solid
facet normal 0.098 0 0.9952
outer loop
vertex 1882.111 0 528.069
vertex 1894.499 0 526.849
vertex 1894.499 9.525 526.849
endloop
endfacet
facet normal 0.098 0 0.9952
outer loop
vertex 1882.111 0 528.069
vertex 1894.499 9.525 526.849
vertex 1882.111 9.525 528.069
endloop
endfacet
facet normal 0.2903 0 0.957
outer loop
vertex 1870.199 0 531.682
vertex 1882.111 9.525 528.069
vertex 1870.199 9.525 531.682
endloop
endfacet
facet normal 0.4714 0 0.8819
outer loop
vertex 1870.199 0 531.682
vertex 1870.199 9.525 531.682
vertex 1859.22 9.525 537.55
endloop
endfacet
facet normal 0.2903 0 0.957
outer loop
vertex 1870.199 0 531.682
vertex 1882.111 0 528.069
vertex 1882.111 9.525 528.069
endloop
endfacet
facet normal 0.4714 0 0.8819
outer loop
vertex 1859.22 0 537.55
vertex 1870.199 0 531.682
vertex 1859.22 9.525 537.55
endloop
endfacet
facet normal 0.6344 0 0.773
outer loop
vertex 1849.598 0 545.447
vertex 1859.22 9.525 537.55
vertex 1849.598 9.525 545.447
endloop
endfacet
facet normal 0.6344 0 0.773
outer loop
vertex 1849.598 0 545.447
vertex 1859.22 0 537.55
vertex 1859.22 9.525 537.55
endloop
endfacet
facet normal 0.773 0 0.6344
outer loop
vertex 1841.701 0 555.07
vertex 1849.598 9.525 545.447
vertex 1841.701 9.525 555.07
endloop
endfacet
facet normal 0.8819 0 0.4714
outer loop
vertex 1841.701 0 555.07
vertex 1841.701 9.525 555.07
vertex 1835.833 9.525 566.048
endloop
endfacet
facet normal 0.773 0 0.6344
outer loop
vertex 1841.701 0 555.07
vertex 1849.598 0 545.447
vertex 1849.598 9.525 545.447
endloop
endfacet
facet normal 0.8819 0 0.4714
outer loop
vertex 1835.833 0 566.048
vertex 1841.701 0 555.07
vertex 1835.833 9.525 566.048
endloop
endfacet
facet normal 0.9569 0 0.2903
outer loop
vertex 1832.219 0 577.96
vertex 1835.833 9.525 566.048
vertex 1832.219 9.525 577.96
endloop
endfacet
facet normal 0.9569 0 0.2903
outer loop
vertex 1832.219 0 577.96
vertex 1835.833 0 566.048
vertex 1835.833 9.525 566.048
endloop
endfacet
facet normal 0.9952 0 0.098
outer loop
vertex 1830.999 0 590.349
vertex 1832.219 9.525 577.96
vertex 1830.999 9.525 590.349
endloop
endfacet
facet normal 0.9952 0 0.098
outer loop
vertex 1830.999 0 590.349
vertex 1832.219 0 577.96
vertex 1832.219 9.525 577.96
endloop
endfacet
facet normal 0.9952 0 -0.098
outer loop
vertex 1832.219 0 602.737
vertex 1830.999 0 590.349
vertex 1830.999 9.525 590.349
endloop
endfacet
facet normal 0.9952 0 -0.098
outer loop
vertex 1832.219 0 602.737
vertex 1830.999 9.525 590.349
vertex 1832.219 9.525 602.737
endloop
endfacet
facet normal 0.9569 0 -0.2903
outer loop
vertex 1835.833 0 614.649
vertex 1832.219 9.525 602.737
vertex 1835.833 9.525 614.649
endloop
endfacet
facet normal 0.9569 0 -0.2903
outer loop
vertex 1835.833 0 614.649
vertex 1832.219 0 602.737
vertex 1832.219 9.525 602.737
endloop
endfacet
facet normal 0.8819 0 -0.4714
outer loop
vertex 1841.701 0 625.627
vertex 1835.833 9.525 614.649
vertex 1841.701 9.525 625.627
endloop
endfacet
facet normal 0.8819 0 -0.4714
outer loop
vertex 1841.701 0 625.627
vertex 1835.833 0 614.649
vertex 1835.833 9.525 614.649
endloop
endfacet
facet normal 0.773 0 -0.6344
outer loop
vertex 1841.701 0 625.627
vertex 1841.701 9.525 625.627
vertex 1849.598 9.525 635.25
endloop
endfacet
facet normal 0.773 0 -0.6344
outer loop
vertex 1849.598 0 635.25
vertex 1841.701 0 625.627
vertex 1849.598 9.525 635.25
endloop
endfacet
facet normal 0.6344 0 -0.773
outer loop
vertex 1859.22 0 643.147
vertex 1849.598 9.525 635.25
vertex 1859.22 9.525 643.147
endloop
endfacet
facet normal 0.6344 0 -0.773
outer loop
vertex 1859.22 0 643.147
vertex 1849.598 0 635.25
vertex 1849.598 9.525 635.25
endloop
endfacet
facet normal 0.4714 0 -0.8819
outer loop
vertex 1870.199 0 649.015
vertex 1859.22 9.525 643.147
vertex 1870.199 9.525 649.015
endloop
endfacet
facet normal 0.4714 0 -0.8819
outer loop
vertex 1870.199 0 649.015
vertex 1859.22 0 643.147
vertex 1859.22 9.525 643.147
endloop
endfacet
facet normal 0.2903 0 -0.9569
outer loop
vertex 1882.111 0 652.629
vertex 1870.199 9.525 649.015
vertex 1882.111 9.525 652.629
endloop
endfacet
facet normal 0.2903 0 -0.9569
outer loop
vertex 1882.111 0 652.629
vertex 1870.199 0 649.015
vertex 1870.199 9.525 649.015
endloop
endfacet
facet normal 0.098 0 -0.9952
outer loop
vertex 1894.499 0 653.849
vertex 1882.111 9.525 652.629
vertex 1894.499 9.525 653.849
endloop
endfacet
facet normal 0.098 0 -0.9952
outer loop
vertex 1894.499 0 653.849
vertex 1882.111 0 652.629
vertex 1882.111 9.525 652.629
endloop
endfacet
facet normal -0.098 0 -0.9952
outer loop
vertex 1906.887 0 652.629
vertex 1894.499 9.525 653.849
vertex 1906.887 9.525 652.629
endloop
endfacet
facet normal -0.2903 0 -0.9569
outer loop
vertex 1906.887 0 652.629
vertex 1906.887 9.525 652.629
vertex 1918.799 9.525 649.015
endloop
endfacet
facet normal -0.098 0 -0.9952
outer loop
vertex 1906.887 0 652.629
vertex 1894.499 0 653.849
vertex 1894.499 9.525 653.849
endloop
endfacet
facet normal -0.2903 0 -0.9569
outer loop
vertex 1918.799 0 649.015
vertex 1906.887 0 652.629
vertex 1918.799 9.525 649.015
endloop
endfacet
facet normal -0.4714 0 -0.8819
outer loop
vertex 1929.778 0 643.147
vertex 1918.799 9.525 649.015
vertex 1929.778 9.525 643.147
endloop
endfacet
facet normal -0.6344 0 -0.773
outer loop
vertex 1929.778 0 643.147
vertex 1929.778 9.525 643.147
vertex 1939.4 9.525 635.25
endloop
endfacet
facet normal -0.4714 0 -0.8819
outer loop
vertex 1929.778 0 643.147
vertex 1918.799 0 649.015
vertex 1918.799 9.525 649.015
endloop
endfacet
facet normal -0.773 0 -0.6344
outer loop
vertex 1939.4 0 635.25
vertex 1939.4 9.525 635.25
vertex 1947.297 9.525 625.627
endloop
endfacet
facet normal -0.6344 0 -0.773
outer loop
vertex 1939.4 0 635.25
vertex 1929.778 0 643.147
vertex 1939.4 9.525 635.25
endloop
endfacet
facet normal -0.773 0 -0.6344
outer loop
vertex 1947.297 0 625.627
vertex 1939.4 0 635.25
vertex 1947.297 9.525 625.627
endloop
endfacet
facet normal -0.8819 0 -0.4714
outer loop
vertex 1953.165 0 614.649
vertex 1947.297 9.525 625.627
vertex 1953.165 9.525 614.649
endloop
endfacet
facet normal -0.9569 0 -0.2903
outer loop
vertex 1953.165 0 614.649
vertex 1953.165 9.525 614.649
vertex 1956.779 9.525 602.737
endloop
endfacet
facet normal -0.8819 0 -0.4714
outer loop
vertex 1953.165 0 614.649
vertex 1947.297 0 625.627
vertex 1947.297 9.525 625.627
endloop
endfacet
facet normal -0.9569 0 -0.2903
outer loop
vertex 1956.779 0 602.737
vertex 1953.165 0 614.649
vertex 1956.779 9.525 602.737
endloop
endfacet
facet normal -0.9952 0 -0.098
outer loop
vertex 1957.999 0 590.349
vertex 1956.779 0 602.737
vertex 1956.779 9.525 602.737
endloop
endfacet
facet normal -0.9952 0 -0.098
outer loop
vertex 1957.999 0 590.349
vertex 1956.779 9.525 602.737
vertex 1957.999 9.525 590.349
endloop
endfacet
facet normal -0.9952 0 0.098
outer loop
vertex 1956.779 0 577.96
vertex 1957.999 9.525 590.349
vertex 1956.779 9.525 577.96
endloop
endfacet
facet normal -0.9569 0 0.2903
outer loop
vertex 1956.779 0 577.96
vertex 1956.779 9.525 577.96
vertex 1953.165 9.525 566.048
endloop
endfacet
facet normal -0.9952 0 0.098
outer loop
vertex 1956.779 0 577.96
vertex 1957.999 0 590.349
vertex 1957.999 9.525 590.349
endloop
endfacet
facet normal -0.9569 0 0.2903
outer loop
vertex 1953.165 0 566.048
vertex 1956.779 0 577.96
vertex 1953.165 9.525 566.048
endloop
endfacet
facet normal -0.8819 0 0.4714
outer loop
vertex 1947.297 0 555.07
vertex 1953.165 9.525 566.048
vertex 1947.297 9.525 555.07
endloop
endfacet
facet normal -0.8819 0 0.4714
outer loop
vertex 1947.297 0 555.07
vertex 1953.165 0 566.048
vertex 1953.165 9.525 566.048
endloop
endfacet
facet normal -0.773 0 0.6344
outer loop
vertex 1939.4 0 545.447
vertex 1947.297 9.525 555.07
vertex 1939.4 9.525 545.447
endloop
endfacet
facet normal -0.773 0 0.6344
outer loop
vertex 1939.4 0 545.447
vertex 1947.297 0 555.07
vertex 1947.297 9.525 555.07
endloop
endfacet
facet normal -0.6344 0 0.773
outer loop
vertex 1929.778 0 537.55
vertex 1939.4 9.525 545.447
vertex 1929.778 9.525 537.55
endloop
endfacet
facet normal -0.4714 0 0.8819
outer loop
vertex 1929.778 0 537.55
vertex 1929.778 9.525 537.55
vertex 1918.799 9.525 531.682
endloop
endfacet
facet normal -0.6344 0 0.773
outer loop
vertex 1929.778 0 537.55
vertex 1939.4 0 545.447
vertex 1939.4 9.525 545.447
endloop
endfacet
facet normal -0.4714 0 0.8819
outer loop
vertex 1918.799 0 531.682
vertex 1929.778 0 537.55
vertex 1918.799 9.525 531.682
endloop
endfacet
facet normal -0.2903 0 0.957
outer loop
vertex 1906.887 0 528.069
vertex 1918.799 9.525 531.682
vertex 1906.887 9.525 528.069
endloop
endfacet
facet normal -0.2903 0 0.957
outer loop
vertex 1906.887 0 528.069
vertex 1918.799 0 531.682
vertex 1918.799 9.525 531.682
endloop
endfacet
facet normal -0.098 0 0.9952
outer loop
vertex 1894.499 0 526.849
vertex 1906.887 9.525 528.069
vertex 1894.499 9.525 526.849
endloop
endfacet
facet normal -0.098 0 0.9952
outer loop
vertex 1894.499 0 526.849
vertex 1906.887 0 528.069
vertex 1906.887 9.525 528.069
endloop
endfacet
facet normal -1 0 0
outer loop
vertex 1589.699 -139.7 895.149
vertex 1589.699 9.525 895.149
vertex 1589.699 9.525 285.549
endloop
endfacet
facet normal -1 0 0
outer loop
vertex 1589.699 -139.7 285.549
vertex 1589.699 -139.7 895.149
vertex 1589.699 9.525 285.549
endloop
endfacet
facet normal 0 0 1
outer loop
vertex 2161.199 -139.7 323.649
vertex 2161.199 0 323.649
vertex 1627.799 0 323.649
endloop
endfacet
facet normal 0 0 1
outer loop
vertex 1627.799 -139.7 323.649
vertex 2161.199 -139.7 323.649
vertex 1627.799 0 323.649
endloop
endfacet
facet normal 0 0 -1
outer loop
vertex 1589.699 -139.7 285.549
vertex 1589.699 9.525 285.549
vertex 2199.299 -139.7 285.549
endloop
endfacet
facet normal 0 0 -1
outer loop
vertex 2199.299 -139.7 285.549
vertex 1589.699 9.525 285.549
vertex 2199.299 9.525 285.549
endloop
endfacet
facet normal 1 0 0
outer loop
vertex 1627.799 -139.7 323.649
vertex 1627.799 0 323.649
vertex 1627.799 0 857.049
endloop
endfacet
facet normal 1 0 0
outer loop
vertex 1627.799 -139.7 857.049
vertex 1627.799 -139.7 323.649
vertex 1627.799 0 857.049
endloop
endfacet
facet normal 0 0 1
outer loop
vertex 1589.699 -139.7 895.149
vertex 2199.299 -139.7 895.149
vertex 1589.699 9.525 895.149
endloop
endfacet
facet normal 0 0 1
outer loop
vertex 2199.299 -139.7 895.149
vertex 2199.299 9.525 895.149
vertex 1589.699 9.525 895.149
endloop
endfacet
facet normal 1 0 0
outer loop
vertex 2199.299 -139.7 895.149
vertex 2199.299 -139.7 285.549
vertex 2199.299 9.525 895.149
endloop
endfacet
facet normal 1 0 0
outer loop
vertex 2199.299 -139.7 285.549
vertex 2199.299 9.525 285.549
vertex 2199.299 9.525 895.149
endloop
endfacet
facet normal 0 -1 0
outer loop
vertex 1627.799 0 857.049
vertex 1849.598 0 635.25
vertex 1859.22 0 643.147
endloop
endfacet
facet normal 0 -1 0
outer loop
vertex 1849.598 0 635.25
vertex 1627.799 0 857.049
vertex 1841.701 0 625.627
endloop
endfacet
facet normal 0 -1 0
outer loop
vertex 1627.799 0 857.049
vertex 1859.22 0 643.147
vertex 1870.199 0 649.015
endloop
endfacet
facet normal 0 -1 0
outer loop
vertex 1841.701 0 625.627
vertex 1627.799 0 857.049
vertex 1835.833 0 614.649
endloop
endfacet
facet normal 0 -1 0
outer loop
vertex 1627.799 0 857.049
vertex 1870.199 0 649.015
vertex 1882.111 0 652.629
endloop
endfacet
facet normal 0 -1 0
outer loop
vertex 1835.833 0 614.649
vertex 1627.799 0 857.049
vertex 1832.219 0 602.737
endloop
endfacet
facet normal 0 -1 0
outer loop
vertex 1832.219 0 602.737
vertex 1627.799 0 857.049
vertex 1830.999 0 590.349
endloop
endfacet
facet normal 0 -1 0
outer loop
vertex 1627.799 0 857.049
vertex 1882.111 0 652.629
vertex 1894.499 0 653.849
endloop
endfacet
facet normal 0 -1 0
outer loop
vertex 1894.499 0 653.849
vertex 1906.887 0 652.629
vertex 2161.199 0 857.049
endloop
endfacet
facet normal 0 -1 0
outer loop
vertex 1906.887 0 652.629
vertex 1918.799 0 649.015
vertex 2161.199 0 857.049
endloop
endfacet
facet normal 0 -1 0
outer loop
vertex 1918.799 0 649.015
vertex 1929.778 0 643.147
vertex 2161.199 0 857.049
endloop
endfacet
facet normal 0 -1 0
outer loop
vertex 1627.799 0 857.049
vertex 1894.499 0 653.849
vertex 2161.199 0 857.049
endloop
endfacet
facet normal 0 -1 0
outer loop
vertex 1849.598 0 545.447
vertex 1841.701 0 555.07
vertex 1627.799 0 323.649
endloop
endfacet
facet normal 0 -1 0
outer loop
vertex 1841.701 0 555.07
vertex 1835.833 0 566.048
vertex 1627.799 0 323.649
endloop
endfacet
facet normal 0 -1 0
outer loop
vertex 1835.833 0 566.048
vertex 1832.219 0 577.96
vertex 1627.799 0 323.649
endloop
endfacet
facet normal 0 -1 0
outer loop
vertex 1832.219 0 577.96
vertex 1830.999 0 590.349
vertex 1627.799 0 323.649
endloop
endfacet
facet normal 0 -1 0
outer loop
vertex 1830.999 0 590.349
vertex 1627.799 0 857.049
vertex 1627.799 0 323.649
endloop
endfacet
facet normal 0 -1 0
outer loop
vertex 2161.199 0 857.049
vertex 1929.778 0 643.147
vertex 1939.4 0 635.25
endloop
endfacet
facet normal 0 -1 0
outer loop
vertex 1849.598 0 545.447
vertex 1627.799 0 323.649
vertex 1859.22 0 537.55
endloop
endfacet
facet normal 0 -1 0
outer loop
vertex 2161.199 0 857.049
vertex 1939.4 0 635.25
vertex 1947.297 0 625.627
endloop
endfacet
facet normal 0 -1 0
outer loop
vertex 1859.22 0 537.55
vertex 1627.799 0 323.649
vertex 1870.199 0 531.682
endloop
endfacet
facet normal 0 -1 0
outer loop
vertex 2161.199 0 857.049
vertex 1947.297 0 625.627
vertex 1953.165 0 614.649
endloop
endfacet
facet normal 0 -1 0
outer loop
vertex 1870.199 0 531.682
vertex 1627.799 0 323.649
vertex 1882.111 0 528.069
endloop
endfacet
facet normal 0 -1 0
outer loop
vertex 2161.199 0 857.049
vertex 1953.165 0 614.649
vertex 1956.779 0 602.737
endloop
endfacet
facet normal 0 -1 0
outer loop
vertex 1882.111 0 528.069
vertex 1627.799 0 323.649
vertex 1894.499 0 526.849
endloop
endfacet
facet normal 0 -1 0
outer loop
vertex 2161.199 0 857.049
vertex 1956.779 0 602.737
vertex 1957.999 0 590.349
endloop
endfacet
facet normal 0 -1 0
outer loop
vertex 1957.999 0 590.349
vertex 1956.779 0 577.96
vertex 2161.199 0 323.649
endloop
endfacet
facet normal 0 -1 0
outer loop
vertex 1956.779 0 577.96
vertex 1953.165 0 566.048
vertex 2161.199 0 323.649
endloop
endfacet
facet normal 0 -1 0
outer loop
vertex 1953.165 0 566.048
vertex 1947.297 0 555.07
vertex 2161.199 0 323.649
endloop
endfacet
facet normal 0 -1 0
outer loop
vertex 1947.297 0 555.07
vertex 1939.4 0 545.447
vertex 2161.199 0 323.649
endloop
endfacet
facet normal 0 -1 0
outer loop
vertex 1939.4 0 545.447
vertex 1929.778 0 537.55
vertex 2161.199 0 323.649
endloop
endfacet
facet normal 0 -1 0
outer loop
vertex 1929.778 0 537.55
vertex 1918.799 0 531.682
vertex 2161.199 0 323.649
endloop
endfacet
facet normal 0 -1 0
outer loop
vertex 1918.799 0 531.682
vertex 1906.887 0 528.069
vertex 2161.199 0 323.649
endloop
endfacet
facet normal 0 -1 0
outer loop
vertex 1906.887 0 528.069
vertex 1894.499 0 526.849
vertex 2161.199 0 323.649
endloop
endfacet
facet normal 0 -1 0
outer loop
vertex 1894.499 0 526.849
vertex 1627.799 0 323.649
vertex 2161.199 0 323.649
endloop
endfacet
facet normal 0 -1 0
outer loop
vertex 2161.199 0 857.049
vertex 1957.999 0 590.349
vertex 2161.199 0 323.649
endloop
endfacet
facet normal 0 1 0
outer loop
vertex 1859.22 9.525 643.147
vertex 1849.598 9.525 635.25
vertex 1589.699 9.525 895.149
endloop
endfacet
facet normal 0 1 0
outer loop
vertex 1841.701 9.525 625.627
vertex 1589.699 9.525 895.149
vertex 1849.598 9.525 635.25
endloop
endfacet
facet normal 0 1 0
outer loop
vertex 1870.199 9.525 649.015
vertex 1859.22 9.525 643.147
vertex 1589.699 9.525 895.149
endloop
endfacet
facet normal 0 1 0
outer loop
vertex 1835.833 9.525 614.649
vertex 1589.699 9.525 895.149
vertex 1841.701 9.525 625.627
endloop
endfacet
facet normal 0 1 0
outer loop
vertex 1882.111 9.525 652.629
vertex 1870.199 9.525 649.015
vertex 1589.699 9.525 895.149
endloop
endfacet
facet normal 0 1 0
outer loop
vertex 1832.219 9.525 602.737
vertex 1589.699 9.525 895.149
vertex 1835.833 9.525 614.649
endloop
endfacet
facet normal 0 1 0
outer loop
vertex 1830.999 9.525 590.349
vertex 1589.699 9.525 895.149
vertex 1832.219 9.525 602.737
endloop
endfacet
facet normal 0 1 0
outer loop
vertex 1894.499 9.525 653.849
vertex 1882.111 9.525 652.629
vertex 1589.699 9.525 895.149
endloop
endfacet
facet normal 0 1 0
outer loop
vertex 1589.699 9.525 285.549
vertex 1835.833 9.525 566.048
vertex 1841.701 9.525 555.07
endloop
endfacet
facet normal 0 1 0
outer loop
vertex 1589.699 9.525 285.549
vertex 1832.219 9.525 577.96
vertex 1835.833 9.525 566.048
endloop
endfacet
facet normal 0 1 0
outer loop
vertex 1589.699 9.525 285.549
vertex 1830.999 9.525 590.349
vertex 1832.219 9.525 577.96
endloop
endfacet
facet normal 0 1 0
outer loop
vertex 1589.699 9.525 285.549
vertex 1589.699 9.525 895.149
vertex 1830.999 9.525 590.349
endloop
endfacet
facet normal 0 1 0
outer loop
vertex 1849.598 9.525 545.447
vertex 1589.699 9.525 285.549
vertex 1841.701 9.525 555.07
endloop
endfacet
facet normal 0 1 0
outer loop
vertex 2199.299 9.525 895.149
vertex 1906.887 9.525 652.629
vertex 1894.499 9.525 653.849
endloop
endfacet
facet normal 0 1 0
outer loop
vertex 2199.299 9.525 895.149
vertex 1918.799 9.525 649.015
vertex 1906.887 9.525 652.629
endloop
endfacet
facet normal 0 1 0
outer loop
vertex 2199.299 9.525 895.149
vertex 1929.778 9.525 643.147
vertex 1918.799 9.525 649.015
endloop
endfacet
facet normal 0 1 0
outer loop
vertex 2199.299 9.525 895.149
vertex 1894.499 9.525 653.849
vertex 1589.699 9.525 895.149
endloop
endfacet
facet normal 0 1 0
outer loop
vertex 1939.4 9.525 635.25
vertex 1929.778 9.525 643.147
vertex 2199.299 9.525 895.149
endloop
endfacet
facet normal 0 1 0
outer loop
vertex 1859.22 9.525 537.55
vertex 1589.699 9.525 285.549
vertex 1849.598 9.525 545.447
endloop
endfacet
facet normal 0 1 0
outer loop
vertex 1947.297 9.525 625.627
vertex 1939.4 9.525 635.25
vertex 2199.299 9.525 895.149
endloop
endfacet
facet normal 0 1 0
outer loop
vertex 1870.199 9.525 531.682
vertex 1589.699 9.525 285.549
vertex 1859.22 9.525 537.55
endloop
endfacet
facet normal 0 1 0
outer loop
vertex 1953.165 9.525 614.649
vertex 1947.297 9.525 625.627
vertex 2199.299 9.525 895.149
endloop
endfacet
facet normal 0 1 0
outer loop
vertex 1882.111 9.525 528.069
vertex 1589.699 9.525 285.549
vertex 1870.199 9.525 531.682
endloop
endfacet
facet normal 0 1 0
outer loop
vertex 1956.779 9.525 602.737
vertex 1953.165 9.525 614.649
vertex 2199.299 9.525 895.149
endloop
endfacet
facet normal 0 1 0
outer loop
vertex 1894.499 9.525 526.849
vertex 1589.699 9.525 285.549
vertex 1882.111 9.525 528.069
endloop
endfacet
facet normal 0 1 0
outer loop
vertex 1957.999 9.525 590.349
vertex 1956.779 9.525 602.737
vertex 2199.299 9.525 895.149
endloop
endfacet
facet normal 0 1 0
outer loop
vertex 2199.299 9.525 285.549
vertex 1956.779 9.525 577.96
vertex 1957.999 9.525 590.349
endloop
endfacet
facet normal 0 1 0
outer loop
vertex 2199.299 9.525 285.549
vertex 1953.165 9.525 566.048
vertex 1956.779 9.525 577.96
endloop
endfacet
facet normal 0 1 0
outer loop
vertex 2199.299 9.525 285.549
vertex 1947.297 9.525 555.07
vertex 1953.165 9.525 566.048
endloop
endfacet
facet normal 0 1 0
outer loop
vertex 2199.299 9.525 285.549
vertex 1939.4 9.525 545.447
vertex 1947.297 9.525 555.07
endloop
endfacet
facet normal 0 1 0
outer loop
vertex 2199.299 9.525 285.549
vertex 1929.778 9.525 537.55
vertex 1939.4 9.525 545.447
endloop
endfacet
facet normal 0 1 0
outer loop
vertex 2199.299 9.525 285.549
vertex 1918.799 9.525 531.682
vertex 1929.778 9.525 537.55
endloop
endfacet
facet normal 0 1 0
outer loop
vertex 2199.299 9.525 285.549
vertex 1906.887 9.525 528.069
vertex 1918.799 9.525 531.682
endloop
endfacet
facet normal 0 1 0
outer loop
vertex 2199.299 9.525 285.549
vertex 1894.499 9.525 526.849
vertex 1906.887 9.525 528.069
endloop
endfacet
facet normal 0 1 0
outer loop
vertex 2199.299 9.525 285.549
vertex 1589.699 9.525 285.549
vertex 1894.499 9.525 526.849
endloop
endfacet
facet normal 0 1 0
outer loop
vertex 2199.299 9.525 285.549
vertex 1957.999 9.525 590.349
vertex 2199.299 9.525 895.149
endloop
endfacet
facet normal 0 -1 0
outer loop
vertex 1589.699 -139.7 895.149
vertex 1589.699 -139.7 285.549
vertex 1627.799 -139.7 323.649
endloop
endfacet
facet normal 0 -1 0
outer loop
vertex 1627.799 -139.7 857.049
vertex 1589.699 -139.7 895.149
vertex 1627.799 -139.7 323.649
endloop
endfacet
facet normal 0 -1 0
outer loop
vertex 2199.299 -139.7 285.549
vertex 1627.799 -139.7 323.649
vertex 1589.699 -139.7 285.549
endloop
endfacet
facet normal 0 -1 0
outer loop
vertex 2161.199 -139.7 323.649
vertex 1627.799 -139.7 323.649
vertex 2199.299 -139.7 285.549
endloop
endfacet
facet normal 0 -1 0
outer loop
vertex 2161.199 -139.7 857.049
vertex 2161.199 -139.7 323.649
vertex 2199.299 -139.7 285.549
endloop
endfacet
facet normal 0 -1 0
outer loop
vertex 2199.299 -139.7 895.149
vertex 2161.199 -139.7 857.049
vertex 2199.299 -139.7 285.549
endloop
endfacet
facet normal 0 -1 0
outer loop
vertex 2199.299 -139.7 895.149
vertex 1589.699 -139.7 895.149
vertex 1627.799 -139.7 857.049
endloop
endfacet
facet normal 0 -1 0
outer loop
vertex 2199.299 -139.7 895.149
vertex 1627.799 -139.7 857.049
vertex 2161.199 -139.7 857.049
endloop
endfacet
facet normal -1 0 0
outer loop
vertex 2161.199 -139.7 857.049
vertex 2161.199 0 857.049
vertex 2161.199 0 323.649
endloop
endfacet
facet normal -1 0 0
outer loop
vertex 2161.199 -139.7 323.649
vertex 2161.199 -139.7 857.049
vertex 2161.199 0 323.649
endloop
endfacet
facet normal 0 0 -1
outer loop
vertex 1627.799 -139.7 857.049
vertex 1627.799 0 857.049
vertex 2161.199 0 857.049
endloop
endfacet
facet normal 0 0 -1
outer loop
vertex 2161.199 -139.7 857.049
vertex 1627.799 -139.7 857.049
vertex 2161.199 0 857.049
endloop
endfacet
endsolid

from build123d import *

# Parameters (mm, degrees)
SKETCH1_W           = 609.6
SKETCH1_H           = 609.6
SKETCH1_R           = 63.5
BOSS_EXTRUDE1_DEPTH = 9.525
BOSS_EXTRUDE2_DEPTH = 139.7


with BuildPart() as part:
    # Sketch1 → Boss-Extrude1 (new body)
    with BuildSketch(Plane(origin=(0, 0, 0), x_dir=(1, 0, 0), z_dir=(0, 1, 0))):
        with Locations((1894.49897269, -590.348674534)):
            Rectangle(SKETCH1_W, SKETCH1_H)
        with Locations(Location((1894.49897269, -590.348674534, 0), (0, 0, 90))):
            Circle(SKETCH1_R, mode=Mode.SUBTRACT)
    extrude(amount=BOSS_EXTRUDE1_DEPTH)

    # Sketch2 → Boss-Extrude2 (add)
    with BuildSketch(Plane.XZ):
        Polygon((1589.69897269, 323.648674534), (1589.69897269, 285.548674534), (1742.09897269, 285.548674534), (2046.89897269, 285.548674534), (2199.29897269, 285.548674534), (2199.29897269, 437.948674534), (2199.29897269, 742.748674534), (2199.29897269, 895.148674534), (2046.89897269, 895.148674534), (1742.09897269, 895.148674534), (1589.69897269, 895.148674534), (1589.69897269, 742.748674534), (1589.69897269, 437.948674534), align=None)
        Polygon((1742.09897269, 323.648674534), (1627.79897269, 323.648674534), (1627.79897269, 437.948674534), (1627.79897269, 742.748674534), (1627.79897269, 857.048674534), (1742.09897269, 857.048674534), (2046.89897269, 857.048674534), (2161.19897269, 857.048674534), (2161.19897269, 742.748674534), (2161.19897269, 437.948674534), (2161.19897269, 323.648674534), (2046.89897269, 323.648674534), align=None, mode=Mode.SUBTRACT)
    extrude(amount=BOSS_EXTRUDE2_DEPTH)


solid = part.part
